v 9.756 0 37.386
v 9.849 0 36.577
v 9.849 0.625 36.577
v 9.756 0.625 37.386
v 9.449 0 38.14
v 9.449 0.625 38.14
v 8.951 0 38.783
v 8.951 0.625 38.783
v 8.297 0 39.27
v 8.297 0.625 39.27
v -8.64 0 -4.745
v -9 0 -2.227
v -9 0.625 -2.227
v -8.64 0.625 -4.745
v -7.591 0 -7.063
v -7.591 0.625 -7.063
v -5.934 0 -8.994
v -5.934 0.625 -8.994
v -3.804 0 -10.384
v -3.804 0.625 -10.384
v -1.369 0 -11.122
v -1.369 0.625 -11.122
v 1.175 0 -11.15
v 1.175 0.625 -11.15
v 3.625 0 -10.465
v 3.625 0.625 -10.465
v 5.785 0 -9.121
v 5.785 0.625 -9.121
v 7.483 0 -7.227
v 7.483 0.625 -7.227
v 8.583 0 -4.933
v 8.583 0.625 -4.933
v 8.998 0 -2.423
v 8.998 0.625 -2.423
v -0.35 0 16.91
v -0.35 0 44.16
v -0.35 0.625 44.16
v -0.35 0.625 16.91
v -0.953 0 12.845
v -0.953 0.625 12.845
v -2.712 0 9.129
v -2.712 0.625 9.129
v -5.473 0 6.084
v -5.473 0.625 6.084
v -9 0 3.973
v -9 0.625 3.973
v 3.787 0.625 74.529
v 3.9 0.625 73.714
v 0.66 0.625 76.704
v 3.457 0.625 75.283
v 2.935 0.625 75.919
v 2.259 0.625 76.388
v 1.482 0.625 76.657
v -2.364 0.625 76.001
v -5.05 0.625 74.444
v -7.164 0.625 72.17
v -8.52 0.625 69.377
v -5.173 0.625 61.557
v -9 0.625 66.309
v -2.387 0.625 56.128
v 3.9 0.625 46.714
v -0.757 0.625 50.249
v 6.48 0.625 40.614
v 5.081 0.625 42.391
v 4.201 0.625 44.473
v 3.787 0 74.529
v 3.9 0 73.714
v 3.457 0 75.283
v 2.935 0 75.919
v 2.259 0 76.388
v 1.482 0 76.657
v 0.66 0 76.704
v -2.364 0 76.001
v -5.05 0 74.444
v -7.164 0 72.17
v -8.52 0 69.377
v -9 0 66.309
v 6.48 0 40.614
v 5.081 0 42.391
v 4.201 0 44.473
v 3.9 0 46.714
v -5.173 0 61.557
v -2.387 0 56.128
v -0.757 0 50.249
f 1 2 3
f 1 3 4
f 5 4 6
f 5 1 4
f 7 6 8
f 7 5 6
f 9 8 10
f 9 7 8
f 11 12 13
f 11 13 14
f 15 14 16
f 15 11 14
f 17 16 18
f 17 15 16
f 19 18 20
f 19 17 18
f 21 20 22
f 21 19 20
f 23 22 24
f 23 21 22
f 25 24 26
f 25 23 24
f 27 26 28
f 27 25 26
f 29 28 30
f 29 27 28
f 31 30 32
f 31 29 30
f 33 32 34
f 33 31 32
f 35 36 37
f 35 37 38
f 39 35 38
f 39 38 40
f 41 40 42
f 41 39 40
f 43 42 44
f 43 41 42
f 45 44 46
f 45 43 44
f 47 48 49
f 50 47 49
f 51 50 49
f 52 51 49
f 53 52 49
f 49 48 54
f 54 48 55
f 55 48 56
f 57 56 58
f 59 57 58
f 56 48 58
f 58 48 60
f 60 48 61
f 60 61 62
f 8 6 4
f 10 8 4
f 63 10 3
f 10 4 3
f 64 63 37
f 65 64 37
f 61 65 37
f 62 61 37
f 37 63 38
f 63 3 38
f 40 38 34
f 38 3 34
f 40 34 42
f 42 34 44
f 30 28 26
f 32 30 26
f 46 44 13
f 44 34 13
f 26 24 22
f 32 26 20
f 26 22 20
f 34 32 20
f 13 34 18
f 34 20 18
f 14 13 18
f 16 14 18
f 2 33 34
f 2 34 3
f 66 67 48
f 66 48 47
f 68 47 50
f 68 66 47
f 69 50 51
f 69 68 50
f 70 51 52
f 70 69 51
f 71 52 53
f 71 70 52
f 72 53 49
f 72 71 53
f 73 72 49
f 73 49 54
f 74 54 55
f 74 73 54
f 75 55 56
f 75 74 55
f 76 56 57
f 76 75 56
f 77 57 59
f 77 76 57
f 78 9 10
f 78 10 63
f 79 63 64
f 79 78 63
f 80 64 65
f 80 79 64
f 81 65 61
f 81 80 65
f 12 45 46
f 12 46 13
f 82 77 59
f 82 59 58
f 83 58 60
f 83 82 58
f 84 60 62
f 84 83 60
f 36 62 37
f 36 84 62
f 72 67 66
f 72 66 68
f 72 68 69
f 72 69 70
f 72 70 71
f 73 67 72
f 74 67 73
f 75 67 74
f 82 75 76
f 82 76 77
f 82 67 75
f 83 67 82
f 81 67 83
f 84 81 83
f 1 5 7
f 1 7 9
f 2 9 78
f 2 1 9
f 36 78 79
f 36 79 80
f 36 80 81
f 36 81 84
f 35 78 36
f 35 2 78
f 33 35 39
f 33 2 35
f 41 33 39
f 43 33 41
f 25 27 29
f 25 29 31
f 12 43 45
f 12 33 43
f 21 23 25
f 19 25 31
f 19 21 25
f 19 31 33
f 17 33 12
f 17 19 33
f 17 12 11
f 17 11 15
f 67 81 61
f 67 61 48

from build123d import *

# Parameters (mm, degrees)
BOSS_EXTRUDE1_DEPTH = 0.625


with BuildPart() as part:
    # Sketch1 → Boss-Extrude1 (new body)
    with BuildSketch(Plane(origin=(0, 0, 0), x_dir=(1, 0, 0), z_dir=(0, 1, 0))):
        with BuildLine():
            Line((8.997858244, 2.423307145), (9.848841271, -36.576692855))
            ThreePointArc((9.848841271, -36.576692855), (9.449049837, -38.139678019), (8.297497314, -39.26958182))
            ThreePointArc((8.297497314, -39.26958182), (5.081486735, -42.390887707), (3.9, -46.714007366))
            Line((3.9, -46.714007366), (3.9, -73.714007366))
            ThreePointArc((3.9, -73.714007366), (2.934734568, -75.918515302), (0.660096509, -76.704399701))
            ThreePointArc((0.660096509, -76.704399701), (-6.19183571, -73.385709721), (-9, -66.309206939))
            ThreePointArc((-9, -66.309206939), (-2.386951858, -56.128417461), (-0.35, -44.160472472))
            Line((-0.35, -44.160472472), (-0.35, -16.910472472))
            ThreePointArc((-0.35, -16.910472472), (-2.711701155, -9.129084421), (-9, -3.97302682))
            Line((-9, -3.97302682), (-9, 2.22697318))
            ThreePointArc((-9, 2.22697318), (-0.098172823, 11.226437725), (8.997858244, 2.423307145))
        make_face()
    extrude(amount=BOSS_EXTRUDE1_DEPTH)


solid = part.part
